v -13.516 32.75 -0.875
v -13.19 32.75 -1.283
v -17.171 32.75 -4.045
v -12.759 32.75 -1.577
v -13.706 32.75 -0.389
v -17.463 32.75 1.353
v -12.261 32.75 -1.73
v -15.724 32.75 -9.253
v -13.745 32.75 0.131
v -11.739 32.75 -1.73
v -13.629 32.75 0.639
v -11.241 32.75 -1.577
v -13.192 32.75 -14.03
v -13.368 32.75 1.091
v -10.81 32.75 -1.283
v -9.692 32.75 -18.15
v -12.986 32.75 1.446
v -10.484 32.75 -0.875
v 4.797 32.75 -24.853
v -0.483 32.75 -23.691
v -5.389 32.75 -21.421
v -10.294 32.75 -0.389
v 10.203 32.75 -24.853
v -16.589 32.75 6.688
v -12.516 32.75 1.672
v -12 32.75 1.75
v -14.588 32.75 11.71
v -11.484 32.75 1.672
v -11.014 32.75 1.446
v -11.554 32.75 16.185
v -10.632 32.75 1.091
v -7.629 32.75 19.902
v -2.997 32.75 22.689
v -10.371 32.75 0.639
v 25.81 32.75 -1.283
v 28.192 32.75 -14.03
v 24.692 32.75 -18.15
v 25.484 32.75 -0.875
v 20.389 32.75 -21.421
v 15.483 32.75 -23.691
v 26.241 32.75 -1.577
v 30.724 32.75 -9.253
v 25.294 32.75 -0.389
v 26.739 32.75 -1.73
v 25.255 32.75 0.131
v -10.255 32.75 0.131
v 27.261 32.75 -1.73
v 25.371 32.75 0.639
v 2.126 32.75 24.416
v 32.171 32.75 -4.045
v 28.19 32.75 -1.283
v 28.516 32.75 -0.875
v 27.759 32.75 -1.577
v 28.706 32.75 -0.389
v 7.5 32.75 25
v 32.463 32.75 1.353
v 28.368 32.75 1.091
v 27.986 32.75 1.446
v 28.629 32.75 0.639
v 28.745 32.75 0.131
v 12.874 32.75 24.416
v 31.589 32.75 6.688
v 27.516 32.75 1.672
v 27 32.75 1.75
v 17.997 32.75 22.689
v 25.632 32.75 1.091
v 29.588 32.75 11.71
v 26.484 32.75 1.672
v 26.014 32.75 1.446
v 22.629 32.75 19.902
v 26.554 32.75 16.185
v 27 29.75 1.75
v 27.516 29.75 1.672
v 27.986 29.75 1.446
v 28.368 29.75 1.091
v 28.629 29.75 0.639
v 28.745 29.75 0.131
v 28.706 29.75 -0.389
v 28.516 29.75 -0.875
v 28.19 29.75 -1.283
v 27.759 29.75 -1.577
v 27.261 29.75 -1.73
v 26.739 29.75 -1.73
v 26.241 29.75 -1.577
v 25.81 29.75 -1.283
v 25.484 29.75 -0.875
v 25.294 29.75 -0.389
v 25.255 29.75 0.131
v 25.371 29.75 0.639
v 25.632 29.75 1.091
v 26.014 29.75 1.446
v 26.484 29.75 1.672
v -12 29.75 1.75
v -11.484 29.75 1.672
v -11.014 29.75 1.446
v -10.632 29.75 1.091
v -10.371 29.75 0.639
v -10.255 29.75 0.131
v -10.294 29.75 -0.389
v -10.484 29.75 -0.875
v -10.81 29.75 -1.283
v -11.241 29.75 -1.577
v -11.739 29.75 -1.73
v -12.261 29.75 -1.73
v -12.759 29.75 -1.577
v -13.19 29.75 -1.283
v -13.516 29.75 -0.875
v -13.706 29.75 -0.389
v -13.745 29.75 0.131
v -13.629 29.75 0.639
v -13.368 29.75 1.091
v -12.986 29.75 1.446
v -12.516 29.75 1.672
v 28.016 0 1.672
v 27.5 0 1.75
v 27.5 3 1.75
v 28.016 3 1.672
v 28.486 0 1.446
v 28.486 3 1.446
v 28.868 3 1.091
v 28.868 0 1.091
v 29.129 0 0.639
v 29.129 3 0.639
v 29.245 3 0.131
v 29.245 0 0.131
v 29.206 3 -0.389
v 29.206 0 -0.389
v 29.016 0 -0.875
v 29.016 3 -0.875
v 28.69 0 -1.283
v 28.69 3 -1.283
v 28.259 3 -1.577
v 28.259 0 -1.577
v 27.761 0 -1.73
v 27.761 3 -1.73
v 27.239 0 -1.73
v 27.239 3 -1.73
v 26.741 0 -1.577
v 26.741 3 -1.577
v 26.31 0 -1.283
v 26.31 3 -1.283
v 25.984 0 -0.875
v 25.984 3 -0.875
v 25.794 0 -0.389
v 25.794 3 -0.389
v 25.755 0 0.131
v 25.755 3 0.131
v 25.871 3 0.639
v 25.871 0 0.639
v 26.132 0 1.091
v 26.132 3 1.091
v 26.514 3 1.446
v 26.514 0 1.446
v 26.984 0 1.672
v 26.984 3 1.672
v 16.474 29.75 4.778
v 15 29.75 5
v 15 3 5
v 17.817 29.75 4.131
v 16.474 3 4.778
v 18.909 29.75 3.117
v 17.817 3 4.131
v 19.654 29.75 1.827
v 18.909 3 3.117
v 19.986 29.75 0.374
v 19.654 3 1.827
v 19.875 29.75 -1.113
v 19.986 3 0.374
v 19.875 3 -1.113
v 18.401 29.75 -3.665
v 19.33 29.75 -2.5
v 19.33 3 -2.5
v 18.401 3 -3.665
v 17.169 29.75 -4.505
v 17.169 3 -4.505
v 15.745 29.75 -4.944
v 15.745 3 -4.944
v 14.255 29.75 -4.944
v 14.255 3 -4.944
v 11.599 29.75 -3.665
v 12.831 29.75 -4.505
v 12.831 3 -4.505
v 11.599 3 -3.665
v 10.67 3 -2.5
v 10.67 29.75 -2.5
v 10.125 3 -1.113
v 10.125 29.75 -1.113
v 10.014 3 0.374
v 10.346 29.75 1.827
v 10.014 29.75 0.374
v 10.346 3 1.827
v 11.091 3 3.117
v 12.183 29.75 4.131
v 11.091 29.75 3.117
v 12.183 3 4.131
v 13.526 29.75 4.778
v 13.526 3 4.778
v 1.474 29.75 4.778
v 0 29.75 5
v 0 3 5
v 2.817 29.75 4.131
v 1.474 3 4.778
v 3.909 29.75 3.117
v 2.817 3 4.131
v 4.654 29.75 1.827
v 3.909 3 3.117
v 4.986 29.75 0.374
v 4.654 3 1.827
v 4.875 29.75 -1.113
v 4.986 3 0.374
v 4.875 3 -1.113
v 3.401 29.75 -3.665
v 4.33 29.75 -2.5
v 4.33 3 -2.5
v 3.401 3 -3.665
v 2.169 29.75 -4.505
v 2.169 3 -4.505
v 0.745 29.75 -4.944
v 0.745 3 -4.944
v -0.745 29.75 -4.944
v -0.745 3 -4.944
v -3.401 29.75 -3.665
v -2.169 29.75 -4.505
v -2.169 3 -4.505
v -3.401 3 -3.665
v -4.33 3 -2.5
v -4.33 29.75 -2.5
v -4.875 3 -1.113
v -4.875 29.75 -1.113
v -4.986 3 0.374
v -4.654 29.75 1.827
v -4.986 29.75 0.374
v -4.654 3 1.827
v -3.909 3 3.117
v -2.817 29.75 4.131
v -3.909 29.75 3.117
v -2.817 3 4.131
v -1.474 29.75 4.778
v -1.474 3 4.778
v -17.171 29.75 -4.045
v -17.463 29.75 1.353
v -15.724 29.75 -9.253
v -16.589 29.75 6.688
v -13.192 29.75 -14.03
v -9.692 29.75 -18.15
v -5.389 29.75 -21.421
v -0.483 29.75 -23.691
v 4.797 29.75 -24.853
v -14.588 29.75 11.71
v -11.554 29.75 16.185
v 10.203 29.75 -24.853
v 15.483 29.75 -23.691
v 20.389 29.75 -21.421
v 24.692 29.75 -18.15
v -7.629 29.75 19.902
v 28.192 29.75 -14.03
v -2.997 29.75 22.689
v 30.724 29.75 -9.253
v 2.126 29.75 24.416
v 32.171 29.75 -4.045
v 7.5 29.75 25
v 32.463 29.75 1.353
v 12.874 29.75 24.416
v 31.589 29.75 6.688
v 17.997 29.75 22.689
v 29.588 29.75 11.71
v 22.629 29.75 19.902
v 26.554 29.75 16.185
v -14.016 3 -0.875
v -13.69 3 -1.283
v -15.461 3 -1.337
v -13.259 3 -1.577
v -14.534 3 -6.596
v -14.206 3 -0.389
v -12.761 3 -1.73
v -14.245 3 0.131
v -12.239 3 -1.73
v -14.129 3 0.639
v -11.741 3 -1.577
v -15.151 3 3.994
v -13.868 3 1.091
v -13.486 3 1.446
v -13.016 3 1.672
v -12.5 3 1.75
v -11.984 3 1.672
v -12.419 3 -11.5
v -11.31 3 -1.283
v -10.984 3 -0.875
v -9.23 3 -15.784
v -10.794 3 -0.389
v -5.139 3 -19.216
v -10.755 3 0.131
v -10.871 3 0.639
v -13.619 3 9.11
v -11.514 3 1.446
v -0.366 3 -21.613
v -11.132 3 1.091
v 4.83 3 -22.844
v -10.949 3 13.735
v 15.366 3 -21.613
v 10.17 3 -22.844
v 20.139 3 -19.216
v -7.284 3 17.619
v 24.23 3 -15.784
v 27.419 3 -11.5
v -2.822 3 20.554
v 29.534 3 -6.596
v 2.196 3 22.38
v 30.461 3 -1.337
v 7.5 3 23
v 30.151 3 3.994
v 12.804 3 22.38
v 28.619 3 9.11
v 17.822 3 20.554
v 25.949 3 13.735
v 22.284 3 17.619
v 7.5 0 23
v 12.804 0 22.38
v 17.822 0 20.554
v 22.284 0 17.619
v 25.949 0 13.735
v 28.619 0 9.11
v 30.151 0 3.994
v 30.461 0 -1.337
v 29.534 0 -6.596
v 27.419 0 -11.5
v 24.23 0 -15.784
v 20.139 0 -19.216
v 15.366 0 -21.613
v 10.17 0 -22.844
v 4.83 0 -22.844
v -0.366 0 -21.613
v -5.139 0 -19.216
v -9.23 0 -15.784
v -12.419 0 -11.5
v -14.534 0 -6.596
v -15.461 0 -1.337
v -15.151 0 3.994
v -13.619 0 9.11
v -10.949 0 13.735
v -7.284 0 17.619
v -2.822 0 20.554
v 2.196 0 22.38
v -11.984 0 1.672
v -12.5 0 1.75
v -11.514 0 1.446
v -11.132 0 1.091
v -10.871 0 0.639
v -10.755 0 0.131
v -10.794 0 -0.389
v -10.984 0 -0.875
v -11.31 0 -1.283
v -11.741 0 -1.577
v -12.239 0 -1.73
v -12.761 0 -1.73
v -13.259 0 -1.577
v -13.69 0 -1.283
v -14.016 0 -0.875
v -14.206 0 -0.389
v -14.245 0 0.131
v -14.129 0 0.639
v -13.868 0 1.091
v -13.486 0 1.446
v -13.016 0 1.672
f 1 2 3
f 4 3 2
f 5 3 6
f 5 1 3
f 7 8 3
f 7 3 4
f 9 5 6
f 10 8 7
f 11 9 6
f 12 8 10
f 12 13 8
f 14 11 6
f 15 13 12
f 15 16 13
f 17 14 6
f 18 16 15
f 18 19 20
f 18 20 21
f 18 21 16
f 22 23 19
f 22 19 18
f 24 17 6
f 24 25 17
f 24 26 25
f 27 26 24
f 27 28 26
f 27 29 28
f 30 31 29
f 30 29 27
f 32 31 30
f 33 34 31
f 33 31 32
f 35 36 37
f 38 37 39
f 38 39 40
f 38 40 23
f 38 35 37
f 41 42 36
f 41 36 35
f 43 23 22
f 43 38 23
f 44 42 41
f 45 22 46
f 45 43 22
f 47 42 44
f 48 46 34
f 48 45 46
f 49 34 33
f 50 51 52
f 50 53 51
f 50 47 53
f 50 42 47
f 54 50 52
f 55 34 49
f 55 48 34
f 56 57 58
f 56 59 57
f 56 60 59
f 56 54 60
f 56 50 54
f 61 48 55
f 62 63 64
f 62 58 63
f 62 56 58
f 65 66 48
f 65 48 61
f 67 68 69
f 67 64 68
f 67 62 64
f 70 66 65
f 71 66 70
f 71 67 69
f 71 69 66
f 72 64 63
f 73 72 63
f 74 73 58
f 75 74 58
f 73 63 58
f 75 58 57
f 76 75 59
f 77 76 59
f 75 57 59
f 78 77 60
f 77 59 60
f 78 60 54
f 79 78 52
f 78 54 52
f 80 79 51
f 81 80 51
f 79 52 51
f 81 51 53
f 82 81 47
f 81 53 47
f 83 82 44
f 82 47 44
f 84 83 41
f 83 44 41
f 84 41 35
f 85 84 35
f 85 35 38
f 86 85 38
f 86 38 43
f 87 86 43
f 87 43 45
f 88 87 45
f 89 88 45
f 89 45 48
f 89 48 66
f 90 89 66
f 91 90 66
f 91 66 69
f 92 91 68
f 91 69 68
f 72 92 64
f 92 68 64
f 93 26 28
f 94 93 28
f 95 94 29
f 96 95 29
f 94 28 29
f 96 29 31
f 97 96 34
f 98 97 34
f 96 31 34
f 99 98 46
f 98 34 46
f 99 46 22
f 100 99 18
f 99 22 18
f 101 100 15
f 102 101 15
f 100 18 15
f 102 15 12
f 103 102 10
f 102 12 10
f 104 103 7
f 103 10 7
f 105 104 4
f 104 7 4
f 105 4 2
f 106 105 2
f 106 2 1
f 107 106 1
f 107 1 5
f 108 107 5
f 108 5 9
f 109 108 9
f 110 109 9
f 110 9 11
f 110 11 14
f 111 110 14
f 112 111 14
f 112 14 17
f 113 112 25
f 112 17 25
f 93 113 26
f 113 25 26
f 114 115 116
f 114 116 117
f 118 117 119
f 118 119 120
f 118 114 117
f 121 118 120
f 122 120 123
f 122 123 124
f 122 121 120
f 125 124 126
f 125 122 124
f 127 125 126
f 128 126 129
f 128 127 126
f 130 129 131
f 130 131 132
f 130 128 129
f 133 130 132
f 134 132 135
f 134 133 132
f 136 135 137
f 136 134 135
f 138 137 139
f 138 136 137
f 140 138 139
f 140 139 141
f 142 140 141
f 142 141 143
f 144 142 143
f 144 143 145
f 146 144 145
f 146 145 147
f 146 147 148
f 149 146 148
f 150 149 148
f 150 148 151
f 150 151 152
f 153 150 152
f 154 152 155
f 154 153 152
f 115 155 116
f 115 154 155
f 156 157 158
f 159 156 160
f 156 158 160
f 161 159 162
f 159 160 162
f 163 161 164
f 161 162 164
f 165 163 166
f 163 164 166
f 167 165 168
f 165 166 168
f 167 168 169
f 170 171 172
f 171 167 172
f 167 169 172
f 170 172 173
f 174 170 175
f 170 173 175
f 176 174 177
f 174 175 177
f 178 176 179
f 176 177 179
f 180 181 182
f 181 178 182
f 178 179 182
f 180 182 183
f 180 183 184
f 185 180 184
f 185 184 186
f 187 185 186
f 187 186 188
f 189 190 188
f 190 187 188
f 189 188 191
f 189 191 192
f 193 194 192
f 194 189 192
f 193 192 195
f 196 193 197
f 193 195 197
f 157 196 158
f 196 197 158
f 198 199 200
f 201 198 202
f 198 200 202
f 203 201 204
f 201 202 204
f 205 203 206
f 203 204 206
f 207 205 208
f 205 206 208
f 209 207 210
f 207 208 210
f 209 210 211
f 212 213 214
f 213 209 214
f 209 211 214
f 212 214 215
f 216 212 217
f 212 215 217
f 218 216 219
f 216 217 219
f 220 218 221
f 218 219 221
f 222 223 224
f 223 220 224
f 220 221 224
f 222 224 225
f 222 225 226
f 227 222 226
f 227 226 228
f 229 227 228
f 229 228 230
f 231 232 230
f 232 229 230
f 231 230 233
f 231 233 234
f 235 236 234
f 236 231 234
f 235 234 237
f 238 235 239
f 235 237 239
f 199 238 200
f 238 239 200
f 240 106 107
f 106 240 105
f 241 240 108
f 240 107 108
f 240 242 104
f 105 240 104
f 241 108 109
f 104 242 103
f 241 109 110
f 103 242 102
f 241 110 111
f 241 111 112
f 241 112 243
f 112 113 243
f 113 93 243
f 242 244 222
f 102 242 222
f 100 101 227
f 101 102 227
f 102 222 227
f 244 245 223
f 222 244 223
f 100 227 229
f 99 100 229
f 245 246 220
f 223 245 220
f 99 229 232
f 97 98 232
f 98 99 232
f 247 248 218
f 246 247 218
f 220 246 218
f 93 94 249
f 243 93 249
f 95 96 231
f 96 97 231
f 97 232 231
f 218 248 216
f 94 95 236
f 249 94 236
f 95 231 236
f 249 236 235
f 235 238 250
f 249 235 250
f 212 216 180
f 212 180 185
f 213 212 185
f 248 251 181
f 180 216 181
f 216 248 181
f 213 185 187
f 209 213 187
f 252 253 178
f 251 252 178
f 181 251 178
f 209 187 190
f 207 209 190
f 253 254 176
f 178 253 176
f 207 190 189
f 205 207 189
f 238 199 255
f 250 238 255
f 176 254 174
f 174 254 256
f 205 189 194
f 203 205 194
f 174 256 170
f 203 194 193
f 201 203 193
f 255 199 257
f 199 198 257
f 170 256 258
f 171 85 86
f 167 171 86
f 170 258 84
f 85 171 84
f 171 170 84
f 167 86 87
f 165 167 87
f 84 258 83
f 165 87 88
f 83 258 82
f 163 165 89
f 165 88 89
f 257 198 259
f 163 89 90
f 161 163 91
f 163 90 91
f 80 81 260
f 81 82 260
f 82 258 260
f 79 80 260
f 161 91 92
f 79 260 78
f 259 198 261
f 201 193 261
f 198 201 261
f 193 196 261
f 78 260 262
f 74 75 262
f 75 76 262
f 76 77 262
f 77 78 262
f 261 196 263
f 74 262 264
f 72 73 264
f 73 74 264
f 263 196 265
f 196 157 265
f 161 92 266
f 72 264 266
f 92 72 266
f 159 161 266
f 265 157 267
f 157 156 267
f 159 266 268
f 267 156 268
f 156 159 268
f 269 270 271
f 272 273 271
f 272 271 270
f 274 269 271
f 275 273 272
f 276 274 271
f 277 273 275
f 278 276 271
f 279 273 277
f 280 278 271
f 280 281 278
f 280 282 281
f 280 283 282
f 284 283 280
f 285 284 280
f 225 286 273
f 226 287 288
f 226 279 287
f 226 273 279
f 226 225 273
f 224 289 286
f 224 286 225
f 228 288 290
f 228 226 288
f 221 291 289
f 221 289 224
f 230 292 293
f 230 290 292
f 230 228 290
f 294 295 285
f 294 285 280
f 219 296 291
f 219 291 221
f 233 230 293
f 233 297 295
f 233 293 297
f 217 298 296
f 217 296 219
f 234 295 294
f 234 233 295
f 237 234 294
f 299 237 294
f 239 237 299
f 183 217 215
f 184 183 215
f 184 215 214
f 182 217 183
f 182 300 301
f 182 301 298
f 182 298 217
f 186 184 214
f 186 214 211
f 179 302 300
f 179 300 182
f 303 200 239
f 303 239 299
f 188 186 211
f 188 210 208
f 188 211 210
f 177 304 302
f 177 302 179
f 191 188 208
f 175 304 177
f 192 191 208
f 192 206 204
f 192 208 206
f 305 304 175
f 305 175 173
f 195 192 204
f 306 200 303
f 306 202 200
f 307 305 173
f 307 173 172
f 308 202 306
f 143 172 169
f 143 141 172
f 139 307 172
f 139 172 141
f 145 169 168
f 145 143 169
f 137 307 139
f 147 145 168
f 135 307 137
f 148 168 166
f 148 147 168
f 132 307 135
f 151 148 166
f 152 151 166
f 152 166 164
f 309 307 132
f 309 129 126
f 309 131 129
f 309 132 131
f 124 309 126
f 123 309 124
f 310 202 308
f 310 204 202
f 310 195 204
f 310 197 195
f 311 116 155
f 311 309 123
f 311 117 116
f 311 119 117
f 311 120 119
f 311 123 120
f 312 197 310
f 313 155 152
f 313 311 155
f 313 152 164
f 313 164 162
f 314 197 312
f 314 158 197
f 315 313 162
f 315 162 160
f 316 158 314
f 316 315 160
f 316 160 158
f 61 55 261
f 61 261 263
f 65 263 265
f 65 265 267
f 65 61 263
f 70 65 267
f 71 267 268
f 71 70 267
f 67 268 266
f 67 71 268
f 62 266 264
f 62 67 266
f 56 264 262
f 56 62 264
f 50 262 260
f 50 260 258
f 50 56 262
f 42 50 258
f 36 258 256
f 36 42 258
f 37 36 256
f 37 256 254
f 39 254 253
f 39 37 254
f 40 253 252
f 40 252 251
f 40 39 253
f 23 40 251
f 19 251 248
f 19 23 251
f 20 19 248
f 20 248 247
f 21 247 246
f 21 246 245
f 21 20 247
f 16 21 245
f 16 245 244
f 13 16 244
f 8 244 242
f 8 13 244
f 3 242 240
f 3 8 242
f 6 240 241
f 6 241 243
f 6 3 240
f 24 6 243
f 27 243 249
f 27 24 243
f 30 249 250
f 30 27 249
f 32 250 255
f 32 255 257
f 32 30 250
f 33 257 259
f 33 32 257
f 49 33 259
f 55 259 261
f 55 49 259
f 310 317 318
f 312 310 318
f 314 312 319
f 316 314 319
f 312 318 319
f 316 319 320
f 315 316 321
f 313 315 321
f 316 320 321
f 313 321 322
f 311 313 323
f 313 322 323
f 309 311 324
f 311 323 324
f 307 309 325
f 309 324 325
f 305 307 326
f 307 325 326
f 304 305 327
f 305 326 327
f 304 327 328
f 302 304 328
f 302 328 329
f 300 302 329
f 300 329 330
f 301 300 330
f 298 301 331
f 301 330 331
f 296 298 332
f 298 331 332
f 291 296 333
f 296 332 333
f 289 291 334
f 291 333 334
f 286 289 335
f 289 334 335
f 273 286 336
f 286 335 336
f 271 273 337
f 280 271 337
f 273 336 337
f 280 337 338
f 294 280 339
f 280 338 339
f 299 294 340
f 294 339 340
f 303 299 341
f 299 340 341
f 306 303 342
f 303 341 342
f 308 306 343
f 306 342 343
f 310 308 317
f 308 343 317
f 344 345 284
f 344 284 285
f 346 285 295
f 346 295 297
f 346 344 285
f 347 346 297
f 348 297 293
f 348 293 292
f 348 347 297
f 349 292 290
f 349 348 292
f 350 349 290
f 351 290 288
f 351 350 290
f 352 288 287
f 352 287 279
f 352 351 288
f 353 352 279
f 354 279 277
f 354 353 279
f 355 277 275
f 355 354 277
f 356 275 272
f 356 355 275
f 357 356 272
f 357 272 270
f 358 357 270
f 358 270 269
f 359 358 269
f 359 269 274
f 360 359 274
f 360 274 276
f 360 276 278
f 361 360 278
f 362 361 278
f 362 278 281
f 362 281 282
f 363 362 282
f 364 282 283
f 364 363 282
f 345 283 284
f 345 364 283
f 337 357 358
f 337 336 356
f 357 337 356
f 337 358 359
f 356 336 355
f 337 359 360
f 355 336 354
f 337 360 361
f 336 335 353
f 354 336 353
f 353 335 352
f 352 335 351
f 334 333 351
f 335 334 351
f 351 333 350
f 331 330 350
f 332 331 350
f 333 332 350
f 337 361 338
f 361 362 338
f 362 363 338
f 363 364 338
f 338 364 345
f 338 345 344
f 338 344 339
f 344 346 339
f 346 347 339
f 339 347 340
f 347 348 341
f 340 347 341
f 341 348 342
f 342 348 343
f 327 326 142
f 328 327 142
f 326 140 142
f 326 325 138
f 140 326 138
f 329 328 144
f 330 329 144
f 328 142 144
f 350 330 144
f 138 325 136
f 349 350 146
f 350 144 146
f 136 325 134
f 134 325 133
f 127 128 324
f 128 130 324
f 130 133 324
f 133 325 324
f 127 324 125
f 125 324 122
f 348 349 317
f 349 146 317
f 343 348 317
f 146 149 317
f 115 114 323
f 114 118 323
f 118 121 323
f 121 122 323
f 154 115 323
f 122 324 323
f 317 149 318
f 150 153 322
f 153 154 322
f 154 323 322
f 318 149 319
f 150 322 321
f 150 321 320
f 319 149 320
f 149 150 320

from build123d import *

# Parameters (mm, degrees)
SKETCH_1_R      = 23
SKETCH_1_R_2    = 1.75
SKETCH_1_R_3    = 5
EXTRUDE_1_DEPTH = 3
SKETCH_1_3_R    = 5
EXTRUDE_2_DEPTH = 32.75
SKETCH_2_R      = 25
SKETCH_2_R_2    = 1.75
EXTRUDE_3_DEPTH = 3


with BuildPart() as part:
    # 草图1 → 凸台-拉伸1 (new body)
    with BuildSketch(Plane(origin=(0, 0, 0), x_dir=(1, 0, 0), z_dir=(0, 1, 0))):
        with Locations(Location((7.5, 0, 0), (0, 0, 270))):
            Circle(SKETCH_1_R)
        with Locations(Location((27.5, 0, 0), (0, 0, 270))):
            Circle(SKETCH_1_R_2, mode=Mode.SUBTRACT)
        with Locations(Location((-12.5, 0, 0), (0, 0, 270))):
            Circle(SKETCH_1_R_2, mode=Mode.SUBTRACT)
        with Locations(Location((0, 0, 0), (0, 0, 270))):
            Circle(SKETCH_1_R_3, mode=Mode.SUBTRACT)
        with Locations(Location((15, 0, 0), (0, 0, 270))):
            Circle(SKETCH_1_R_3, mode=Mode.SUBTRACT)
    extrude(amount=EXTRUDE_1_DEPTH)

    # 草图1<3> → 凸台-拉伸2 (add)
    with BuildSketch(Plane(origin=(0, 0, 0), x_dir=(1, 0, 0), z_dir=(0, 1, 0))):
        with Locations(Location((0, 0, 0), (0, 0, 270))):
            Circle(SKETCH_1_3_R)
        with Locations(Location((15, 0, 0), (0, 0, 270))):
            Circle(SKETCH_1_3_R)
    extrude(amount=EXTRUDE_2_DEPTH)

    # 草图2 → 凸台-拉伸3 (add)
    with BuildSketch(Plane(origin=(0, 32.75, 0), x_dir=(1, 0, 0), z_dir=(0, 1, 0))):
        with Locations(Location((7.5, 0, 0), (0, 0, 270))):
            Circle(SKETCH_2_R)
        with Locations(Location((-12, 0, 0), (0, 0, 270))):
            Circle(SKETCH_2_R_2, mode=Mode.SUBTRACT)
        with Locations(Location((27, 0, 0), (0, 0, 270))):
            Circle(SKETCH_2_R_2, mode=Mode.SUBTRACT)
    extrude(amount=-EXTRUDE_3_DEPTH)


solid = part.part
